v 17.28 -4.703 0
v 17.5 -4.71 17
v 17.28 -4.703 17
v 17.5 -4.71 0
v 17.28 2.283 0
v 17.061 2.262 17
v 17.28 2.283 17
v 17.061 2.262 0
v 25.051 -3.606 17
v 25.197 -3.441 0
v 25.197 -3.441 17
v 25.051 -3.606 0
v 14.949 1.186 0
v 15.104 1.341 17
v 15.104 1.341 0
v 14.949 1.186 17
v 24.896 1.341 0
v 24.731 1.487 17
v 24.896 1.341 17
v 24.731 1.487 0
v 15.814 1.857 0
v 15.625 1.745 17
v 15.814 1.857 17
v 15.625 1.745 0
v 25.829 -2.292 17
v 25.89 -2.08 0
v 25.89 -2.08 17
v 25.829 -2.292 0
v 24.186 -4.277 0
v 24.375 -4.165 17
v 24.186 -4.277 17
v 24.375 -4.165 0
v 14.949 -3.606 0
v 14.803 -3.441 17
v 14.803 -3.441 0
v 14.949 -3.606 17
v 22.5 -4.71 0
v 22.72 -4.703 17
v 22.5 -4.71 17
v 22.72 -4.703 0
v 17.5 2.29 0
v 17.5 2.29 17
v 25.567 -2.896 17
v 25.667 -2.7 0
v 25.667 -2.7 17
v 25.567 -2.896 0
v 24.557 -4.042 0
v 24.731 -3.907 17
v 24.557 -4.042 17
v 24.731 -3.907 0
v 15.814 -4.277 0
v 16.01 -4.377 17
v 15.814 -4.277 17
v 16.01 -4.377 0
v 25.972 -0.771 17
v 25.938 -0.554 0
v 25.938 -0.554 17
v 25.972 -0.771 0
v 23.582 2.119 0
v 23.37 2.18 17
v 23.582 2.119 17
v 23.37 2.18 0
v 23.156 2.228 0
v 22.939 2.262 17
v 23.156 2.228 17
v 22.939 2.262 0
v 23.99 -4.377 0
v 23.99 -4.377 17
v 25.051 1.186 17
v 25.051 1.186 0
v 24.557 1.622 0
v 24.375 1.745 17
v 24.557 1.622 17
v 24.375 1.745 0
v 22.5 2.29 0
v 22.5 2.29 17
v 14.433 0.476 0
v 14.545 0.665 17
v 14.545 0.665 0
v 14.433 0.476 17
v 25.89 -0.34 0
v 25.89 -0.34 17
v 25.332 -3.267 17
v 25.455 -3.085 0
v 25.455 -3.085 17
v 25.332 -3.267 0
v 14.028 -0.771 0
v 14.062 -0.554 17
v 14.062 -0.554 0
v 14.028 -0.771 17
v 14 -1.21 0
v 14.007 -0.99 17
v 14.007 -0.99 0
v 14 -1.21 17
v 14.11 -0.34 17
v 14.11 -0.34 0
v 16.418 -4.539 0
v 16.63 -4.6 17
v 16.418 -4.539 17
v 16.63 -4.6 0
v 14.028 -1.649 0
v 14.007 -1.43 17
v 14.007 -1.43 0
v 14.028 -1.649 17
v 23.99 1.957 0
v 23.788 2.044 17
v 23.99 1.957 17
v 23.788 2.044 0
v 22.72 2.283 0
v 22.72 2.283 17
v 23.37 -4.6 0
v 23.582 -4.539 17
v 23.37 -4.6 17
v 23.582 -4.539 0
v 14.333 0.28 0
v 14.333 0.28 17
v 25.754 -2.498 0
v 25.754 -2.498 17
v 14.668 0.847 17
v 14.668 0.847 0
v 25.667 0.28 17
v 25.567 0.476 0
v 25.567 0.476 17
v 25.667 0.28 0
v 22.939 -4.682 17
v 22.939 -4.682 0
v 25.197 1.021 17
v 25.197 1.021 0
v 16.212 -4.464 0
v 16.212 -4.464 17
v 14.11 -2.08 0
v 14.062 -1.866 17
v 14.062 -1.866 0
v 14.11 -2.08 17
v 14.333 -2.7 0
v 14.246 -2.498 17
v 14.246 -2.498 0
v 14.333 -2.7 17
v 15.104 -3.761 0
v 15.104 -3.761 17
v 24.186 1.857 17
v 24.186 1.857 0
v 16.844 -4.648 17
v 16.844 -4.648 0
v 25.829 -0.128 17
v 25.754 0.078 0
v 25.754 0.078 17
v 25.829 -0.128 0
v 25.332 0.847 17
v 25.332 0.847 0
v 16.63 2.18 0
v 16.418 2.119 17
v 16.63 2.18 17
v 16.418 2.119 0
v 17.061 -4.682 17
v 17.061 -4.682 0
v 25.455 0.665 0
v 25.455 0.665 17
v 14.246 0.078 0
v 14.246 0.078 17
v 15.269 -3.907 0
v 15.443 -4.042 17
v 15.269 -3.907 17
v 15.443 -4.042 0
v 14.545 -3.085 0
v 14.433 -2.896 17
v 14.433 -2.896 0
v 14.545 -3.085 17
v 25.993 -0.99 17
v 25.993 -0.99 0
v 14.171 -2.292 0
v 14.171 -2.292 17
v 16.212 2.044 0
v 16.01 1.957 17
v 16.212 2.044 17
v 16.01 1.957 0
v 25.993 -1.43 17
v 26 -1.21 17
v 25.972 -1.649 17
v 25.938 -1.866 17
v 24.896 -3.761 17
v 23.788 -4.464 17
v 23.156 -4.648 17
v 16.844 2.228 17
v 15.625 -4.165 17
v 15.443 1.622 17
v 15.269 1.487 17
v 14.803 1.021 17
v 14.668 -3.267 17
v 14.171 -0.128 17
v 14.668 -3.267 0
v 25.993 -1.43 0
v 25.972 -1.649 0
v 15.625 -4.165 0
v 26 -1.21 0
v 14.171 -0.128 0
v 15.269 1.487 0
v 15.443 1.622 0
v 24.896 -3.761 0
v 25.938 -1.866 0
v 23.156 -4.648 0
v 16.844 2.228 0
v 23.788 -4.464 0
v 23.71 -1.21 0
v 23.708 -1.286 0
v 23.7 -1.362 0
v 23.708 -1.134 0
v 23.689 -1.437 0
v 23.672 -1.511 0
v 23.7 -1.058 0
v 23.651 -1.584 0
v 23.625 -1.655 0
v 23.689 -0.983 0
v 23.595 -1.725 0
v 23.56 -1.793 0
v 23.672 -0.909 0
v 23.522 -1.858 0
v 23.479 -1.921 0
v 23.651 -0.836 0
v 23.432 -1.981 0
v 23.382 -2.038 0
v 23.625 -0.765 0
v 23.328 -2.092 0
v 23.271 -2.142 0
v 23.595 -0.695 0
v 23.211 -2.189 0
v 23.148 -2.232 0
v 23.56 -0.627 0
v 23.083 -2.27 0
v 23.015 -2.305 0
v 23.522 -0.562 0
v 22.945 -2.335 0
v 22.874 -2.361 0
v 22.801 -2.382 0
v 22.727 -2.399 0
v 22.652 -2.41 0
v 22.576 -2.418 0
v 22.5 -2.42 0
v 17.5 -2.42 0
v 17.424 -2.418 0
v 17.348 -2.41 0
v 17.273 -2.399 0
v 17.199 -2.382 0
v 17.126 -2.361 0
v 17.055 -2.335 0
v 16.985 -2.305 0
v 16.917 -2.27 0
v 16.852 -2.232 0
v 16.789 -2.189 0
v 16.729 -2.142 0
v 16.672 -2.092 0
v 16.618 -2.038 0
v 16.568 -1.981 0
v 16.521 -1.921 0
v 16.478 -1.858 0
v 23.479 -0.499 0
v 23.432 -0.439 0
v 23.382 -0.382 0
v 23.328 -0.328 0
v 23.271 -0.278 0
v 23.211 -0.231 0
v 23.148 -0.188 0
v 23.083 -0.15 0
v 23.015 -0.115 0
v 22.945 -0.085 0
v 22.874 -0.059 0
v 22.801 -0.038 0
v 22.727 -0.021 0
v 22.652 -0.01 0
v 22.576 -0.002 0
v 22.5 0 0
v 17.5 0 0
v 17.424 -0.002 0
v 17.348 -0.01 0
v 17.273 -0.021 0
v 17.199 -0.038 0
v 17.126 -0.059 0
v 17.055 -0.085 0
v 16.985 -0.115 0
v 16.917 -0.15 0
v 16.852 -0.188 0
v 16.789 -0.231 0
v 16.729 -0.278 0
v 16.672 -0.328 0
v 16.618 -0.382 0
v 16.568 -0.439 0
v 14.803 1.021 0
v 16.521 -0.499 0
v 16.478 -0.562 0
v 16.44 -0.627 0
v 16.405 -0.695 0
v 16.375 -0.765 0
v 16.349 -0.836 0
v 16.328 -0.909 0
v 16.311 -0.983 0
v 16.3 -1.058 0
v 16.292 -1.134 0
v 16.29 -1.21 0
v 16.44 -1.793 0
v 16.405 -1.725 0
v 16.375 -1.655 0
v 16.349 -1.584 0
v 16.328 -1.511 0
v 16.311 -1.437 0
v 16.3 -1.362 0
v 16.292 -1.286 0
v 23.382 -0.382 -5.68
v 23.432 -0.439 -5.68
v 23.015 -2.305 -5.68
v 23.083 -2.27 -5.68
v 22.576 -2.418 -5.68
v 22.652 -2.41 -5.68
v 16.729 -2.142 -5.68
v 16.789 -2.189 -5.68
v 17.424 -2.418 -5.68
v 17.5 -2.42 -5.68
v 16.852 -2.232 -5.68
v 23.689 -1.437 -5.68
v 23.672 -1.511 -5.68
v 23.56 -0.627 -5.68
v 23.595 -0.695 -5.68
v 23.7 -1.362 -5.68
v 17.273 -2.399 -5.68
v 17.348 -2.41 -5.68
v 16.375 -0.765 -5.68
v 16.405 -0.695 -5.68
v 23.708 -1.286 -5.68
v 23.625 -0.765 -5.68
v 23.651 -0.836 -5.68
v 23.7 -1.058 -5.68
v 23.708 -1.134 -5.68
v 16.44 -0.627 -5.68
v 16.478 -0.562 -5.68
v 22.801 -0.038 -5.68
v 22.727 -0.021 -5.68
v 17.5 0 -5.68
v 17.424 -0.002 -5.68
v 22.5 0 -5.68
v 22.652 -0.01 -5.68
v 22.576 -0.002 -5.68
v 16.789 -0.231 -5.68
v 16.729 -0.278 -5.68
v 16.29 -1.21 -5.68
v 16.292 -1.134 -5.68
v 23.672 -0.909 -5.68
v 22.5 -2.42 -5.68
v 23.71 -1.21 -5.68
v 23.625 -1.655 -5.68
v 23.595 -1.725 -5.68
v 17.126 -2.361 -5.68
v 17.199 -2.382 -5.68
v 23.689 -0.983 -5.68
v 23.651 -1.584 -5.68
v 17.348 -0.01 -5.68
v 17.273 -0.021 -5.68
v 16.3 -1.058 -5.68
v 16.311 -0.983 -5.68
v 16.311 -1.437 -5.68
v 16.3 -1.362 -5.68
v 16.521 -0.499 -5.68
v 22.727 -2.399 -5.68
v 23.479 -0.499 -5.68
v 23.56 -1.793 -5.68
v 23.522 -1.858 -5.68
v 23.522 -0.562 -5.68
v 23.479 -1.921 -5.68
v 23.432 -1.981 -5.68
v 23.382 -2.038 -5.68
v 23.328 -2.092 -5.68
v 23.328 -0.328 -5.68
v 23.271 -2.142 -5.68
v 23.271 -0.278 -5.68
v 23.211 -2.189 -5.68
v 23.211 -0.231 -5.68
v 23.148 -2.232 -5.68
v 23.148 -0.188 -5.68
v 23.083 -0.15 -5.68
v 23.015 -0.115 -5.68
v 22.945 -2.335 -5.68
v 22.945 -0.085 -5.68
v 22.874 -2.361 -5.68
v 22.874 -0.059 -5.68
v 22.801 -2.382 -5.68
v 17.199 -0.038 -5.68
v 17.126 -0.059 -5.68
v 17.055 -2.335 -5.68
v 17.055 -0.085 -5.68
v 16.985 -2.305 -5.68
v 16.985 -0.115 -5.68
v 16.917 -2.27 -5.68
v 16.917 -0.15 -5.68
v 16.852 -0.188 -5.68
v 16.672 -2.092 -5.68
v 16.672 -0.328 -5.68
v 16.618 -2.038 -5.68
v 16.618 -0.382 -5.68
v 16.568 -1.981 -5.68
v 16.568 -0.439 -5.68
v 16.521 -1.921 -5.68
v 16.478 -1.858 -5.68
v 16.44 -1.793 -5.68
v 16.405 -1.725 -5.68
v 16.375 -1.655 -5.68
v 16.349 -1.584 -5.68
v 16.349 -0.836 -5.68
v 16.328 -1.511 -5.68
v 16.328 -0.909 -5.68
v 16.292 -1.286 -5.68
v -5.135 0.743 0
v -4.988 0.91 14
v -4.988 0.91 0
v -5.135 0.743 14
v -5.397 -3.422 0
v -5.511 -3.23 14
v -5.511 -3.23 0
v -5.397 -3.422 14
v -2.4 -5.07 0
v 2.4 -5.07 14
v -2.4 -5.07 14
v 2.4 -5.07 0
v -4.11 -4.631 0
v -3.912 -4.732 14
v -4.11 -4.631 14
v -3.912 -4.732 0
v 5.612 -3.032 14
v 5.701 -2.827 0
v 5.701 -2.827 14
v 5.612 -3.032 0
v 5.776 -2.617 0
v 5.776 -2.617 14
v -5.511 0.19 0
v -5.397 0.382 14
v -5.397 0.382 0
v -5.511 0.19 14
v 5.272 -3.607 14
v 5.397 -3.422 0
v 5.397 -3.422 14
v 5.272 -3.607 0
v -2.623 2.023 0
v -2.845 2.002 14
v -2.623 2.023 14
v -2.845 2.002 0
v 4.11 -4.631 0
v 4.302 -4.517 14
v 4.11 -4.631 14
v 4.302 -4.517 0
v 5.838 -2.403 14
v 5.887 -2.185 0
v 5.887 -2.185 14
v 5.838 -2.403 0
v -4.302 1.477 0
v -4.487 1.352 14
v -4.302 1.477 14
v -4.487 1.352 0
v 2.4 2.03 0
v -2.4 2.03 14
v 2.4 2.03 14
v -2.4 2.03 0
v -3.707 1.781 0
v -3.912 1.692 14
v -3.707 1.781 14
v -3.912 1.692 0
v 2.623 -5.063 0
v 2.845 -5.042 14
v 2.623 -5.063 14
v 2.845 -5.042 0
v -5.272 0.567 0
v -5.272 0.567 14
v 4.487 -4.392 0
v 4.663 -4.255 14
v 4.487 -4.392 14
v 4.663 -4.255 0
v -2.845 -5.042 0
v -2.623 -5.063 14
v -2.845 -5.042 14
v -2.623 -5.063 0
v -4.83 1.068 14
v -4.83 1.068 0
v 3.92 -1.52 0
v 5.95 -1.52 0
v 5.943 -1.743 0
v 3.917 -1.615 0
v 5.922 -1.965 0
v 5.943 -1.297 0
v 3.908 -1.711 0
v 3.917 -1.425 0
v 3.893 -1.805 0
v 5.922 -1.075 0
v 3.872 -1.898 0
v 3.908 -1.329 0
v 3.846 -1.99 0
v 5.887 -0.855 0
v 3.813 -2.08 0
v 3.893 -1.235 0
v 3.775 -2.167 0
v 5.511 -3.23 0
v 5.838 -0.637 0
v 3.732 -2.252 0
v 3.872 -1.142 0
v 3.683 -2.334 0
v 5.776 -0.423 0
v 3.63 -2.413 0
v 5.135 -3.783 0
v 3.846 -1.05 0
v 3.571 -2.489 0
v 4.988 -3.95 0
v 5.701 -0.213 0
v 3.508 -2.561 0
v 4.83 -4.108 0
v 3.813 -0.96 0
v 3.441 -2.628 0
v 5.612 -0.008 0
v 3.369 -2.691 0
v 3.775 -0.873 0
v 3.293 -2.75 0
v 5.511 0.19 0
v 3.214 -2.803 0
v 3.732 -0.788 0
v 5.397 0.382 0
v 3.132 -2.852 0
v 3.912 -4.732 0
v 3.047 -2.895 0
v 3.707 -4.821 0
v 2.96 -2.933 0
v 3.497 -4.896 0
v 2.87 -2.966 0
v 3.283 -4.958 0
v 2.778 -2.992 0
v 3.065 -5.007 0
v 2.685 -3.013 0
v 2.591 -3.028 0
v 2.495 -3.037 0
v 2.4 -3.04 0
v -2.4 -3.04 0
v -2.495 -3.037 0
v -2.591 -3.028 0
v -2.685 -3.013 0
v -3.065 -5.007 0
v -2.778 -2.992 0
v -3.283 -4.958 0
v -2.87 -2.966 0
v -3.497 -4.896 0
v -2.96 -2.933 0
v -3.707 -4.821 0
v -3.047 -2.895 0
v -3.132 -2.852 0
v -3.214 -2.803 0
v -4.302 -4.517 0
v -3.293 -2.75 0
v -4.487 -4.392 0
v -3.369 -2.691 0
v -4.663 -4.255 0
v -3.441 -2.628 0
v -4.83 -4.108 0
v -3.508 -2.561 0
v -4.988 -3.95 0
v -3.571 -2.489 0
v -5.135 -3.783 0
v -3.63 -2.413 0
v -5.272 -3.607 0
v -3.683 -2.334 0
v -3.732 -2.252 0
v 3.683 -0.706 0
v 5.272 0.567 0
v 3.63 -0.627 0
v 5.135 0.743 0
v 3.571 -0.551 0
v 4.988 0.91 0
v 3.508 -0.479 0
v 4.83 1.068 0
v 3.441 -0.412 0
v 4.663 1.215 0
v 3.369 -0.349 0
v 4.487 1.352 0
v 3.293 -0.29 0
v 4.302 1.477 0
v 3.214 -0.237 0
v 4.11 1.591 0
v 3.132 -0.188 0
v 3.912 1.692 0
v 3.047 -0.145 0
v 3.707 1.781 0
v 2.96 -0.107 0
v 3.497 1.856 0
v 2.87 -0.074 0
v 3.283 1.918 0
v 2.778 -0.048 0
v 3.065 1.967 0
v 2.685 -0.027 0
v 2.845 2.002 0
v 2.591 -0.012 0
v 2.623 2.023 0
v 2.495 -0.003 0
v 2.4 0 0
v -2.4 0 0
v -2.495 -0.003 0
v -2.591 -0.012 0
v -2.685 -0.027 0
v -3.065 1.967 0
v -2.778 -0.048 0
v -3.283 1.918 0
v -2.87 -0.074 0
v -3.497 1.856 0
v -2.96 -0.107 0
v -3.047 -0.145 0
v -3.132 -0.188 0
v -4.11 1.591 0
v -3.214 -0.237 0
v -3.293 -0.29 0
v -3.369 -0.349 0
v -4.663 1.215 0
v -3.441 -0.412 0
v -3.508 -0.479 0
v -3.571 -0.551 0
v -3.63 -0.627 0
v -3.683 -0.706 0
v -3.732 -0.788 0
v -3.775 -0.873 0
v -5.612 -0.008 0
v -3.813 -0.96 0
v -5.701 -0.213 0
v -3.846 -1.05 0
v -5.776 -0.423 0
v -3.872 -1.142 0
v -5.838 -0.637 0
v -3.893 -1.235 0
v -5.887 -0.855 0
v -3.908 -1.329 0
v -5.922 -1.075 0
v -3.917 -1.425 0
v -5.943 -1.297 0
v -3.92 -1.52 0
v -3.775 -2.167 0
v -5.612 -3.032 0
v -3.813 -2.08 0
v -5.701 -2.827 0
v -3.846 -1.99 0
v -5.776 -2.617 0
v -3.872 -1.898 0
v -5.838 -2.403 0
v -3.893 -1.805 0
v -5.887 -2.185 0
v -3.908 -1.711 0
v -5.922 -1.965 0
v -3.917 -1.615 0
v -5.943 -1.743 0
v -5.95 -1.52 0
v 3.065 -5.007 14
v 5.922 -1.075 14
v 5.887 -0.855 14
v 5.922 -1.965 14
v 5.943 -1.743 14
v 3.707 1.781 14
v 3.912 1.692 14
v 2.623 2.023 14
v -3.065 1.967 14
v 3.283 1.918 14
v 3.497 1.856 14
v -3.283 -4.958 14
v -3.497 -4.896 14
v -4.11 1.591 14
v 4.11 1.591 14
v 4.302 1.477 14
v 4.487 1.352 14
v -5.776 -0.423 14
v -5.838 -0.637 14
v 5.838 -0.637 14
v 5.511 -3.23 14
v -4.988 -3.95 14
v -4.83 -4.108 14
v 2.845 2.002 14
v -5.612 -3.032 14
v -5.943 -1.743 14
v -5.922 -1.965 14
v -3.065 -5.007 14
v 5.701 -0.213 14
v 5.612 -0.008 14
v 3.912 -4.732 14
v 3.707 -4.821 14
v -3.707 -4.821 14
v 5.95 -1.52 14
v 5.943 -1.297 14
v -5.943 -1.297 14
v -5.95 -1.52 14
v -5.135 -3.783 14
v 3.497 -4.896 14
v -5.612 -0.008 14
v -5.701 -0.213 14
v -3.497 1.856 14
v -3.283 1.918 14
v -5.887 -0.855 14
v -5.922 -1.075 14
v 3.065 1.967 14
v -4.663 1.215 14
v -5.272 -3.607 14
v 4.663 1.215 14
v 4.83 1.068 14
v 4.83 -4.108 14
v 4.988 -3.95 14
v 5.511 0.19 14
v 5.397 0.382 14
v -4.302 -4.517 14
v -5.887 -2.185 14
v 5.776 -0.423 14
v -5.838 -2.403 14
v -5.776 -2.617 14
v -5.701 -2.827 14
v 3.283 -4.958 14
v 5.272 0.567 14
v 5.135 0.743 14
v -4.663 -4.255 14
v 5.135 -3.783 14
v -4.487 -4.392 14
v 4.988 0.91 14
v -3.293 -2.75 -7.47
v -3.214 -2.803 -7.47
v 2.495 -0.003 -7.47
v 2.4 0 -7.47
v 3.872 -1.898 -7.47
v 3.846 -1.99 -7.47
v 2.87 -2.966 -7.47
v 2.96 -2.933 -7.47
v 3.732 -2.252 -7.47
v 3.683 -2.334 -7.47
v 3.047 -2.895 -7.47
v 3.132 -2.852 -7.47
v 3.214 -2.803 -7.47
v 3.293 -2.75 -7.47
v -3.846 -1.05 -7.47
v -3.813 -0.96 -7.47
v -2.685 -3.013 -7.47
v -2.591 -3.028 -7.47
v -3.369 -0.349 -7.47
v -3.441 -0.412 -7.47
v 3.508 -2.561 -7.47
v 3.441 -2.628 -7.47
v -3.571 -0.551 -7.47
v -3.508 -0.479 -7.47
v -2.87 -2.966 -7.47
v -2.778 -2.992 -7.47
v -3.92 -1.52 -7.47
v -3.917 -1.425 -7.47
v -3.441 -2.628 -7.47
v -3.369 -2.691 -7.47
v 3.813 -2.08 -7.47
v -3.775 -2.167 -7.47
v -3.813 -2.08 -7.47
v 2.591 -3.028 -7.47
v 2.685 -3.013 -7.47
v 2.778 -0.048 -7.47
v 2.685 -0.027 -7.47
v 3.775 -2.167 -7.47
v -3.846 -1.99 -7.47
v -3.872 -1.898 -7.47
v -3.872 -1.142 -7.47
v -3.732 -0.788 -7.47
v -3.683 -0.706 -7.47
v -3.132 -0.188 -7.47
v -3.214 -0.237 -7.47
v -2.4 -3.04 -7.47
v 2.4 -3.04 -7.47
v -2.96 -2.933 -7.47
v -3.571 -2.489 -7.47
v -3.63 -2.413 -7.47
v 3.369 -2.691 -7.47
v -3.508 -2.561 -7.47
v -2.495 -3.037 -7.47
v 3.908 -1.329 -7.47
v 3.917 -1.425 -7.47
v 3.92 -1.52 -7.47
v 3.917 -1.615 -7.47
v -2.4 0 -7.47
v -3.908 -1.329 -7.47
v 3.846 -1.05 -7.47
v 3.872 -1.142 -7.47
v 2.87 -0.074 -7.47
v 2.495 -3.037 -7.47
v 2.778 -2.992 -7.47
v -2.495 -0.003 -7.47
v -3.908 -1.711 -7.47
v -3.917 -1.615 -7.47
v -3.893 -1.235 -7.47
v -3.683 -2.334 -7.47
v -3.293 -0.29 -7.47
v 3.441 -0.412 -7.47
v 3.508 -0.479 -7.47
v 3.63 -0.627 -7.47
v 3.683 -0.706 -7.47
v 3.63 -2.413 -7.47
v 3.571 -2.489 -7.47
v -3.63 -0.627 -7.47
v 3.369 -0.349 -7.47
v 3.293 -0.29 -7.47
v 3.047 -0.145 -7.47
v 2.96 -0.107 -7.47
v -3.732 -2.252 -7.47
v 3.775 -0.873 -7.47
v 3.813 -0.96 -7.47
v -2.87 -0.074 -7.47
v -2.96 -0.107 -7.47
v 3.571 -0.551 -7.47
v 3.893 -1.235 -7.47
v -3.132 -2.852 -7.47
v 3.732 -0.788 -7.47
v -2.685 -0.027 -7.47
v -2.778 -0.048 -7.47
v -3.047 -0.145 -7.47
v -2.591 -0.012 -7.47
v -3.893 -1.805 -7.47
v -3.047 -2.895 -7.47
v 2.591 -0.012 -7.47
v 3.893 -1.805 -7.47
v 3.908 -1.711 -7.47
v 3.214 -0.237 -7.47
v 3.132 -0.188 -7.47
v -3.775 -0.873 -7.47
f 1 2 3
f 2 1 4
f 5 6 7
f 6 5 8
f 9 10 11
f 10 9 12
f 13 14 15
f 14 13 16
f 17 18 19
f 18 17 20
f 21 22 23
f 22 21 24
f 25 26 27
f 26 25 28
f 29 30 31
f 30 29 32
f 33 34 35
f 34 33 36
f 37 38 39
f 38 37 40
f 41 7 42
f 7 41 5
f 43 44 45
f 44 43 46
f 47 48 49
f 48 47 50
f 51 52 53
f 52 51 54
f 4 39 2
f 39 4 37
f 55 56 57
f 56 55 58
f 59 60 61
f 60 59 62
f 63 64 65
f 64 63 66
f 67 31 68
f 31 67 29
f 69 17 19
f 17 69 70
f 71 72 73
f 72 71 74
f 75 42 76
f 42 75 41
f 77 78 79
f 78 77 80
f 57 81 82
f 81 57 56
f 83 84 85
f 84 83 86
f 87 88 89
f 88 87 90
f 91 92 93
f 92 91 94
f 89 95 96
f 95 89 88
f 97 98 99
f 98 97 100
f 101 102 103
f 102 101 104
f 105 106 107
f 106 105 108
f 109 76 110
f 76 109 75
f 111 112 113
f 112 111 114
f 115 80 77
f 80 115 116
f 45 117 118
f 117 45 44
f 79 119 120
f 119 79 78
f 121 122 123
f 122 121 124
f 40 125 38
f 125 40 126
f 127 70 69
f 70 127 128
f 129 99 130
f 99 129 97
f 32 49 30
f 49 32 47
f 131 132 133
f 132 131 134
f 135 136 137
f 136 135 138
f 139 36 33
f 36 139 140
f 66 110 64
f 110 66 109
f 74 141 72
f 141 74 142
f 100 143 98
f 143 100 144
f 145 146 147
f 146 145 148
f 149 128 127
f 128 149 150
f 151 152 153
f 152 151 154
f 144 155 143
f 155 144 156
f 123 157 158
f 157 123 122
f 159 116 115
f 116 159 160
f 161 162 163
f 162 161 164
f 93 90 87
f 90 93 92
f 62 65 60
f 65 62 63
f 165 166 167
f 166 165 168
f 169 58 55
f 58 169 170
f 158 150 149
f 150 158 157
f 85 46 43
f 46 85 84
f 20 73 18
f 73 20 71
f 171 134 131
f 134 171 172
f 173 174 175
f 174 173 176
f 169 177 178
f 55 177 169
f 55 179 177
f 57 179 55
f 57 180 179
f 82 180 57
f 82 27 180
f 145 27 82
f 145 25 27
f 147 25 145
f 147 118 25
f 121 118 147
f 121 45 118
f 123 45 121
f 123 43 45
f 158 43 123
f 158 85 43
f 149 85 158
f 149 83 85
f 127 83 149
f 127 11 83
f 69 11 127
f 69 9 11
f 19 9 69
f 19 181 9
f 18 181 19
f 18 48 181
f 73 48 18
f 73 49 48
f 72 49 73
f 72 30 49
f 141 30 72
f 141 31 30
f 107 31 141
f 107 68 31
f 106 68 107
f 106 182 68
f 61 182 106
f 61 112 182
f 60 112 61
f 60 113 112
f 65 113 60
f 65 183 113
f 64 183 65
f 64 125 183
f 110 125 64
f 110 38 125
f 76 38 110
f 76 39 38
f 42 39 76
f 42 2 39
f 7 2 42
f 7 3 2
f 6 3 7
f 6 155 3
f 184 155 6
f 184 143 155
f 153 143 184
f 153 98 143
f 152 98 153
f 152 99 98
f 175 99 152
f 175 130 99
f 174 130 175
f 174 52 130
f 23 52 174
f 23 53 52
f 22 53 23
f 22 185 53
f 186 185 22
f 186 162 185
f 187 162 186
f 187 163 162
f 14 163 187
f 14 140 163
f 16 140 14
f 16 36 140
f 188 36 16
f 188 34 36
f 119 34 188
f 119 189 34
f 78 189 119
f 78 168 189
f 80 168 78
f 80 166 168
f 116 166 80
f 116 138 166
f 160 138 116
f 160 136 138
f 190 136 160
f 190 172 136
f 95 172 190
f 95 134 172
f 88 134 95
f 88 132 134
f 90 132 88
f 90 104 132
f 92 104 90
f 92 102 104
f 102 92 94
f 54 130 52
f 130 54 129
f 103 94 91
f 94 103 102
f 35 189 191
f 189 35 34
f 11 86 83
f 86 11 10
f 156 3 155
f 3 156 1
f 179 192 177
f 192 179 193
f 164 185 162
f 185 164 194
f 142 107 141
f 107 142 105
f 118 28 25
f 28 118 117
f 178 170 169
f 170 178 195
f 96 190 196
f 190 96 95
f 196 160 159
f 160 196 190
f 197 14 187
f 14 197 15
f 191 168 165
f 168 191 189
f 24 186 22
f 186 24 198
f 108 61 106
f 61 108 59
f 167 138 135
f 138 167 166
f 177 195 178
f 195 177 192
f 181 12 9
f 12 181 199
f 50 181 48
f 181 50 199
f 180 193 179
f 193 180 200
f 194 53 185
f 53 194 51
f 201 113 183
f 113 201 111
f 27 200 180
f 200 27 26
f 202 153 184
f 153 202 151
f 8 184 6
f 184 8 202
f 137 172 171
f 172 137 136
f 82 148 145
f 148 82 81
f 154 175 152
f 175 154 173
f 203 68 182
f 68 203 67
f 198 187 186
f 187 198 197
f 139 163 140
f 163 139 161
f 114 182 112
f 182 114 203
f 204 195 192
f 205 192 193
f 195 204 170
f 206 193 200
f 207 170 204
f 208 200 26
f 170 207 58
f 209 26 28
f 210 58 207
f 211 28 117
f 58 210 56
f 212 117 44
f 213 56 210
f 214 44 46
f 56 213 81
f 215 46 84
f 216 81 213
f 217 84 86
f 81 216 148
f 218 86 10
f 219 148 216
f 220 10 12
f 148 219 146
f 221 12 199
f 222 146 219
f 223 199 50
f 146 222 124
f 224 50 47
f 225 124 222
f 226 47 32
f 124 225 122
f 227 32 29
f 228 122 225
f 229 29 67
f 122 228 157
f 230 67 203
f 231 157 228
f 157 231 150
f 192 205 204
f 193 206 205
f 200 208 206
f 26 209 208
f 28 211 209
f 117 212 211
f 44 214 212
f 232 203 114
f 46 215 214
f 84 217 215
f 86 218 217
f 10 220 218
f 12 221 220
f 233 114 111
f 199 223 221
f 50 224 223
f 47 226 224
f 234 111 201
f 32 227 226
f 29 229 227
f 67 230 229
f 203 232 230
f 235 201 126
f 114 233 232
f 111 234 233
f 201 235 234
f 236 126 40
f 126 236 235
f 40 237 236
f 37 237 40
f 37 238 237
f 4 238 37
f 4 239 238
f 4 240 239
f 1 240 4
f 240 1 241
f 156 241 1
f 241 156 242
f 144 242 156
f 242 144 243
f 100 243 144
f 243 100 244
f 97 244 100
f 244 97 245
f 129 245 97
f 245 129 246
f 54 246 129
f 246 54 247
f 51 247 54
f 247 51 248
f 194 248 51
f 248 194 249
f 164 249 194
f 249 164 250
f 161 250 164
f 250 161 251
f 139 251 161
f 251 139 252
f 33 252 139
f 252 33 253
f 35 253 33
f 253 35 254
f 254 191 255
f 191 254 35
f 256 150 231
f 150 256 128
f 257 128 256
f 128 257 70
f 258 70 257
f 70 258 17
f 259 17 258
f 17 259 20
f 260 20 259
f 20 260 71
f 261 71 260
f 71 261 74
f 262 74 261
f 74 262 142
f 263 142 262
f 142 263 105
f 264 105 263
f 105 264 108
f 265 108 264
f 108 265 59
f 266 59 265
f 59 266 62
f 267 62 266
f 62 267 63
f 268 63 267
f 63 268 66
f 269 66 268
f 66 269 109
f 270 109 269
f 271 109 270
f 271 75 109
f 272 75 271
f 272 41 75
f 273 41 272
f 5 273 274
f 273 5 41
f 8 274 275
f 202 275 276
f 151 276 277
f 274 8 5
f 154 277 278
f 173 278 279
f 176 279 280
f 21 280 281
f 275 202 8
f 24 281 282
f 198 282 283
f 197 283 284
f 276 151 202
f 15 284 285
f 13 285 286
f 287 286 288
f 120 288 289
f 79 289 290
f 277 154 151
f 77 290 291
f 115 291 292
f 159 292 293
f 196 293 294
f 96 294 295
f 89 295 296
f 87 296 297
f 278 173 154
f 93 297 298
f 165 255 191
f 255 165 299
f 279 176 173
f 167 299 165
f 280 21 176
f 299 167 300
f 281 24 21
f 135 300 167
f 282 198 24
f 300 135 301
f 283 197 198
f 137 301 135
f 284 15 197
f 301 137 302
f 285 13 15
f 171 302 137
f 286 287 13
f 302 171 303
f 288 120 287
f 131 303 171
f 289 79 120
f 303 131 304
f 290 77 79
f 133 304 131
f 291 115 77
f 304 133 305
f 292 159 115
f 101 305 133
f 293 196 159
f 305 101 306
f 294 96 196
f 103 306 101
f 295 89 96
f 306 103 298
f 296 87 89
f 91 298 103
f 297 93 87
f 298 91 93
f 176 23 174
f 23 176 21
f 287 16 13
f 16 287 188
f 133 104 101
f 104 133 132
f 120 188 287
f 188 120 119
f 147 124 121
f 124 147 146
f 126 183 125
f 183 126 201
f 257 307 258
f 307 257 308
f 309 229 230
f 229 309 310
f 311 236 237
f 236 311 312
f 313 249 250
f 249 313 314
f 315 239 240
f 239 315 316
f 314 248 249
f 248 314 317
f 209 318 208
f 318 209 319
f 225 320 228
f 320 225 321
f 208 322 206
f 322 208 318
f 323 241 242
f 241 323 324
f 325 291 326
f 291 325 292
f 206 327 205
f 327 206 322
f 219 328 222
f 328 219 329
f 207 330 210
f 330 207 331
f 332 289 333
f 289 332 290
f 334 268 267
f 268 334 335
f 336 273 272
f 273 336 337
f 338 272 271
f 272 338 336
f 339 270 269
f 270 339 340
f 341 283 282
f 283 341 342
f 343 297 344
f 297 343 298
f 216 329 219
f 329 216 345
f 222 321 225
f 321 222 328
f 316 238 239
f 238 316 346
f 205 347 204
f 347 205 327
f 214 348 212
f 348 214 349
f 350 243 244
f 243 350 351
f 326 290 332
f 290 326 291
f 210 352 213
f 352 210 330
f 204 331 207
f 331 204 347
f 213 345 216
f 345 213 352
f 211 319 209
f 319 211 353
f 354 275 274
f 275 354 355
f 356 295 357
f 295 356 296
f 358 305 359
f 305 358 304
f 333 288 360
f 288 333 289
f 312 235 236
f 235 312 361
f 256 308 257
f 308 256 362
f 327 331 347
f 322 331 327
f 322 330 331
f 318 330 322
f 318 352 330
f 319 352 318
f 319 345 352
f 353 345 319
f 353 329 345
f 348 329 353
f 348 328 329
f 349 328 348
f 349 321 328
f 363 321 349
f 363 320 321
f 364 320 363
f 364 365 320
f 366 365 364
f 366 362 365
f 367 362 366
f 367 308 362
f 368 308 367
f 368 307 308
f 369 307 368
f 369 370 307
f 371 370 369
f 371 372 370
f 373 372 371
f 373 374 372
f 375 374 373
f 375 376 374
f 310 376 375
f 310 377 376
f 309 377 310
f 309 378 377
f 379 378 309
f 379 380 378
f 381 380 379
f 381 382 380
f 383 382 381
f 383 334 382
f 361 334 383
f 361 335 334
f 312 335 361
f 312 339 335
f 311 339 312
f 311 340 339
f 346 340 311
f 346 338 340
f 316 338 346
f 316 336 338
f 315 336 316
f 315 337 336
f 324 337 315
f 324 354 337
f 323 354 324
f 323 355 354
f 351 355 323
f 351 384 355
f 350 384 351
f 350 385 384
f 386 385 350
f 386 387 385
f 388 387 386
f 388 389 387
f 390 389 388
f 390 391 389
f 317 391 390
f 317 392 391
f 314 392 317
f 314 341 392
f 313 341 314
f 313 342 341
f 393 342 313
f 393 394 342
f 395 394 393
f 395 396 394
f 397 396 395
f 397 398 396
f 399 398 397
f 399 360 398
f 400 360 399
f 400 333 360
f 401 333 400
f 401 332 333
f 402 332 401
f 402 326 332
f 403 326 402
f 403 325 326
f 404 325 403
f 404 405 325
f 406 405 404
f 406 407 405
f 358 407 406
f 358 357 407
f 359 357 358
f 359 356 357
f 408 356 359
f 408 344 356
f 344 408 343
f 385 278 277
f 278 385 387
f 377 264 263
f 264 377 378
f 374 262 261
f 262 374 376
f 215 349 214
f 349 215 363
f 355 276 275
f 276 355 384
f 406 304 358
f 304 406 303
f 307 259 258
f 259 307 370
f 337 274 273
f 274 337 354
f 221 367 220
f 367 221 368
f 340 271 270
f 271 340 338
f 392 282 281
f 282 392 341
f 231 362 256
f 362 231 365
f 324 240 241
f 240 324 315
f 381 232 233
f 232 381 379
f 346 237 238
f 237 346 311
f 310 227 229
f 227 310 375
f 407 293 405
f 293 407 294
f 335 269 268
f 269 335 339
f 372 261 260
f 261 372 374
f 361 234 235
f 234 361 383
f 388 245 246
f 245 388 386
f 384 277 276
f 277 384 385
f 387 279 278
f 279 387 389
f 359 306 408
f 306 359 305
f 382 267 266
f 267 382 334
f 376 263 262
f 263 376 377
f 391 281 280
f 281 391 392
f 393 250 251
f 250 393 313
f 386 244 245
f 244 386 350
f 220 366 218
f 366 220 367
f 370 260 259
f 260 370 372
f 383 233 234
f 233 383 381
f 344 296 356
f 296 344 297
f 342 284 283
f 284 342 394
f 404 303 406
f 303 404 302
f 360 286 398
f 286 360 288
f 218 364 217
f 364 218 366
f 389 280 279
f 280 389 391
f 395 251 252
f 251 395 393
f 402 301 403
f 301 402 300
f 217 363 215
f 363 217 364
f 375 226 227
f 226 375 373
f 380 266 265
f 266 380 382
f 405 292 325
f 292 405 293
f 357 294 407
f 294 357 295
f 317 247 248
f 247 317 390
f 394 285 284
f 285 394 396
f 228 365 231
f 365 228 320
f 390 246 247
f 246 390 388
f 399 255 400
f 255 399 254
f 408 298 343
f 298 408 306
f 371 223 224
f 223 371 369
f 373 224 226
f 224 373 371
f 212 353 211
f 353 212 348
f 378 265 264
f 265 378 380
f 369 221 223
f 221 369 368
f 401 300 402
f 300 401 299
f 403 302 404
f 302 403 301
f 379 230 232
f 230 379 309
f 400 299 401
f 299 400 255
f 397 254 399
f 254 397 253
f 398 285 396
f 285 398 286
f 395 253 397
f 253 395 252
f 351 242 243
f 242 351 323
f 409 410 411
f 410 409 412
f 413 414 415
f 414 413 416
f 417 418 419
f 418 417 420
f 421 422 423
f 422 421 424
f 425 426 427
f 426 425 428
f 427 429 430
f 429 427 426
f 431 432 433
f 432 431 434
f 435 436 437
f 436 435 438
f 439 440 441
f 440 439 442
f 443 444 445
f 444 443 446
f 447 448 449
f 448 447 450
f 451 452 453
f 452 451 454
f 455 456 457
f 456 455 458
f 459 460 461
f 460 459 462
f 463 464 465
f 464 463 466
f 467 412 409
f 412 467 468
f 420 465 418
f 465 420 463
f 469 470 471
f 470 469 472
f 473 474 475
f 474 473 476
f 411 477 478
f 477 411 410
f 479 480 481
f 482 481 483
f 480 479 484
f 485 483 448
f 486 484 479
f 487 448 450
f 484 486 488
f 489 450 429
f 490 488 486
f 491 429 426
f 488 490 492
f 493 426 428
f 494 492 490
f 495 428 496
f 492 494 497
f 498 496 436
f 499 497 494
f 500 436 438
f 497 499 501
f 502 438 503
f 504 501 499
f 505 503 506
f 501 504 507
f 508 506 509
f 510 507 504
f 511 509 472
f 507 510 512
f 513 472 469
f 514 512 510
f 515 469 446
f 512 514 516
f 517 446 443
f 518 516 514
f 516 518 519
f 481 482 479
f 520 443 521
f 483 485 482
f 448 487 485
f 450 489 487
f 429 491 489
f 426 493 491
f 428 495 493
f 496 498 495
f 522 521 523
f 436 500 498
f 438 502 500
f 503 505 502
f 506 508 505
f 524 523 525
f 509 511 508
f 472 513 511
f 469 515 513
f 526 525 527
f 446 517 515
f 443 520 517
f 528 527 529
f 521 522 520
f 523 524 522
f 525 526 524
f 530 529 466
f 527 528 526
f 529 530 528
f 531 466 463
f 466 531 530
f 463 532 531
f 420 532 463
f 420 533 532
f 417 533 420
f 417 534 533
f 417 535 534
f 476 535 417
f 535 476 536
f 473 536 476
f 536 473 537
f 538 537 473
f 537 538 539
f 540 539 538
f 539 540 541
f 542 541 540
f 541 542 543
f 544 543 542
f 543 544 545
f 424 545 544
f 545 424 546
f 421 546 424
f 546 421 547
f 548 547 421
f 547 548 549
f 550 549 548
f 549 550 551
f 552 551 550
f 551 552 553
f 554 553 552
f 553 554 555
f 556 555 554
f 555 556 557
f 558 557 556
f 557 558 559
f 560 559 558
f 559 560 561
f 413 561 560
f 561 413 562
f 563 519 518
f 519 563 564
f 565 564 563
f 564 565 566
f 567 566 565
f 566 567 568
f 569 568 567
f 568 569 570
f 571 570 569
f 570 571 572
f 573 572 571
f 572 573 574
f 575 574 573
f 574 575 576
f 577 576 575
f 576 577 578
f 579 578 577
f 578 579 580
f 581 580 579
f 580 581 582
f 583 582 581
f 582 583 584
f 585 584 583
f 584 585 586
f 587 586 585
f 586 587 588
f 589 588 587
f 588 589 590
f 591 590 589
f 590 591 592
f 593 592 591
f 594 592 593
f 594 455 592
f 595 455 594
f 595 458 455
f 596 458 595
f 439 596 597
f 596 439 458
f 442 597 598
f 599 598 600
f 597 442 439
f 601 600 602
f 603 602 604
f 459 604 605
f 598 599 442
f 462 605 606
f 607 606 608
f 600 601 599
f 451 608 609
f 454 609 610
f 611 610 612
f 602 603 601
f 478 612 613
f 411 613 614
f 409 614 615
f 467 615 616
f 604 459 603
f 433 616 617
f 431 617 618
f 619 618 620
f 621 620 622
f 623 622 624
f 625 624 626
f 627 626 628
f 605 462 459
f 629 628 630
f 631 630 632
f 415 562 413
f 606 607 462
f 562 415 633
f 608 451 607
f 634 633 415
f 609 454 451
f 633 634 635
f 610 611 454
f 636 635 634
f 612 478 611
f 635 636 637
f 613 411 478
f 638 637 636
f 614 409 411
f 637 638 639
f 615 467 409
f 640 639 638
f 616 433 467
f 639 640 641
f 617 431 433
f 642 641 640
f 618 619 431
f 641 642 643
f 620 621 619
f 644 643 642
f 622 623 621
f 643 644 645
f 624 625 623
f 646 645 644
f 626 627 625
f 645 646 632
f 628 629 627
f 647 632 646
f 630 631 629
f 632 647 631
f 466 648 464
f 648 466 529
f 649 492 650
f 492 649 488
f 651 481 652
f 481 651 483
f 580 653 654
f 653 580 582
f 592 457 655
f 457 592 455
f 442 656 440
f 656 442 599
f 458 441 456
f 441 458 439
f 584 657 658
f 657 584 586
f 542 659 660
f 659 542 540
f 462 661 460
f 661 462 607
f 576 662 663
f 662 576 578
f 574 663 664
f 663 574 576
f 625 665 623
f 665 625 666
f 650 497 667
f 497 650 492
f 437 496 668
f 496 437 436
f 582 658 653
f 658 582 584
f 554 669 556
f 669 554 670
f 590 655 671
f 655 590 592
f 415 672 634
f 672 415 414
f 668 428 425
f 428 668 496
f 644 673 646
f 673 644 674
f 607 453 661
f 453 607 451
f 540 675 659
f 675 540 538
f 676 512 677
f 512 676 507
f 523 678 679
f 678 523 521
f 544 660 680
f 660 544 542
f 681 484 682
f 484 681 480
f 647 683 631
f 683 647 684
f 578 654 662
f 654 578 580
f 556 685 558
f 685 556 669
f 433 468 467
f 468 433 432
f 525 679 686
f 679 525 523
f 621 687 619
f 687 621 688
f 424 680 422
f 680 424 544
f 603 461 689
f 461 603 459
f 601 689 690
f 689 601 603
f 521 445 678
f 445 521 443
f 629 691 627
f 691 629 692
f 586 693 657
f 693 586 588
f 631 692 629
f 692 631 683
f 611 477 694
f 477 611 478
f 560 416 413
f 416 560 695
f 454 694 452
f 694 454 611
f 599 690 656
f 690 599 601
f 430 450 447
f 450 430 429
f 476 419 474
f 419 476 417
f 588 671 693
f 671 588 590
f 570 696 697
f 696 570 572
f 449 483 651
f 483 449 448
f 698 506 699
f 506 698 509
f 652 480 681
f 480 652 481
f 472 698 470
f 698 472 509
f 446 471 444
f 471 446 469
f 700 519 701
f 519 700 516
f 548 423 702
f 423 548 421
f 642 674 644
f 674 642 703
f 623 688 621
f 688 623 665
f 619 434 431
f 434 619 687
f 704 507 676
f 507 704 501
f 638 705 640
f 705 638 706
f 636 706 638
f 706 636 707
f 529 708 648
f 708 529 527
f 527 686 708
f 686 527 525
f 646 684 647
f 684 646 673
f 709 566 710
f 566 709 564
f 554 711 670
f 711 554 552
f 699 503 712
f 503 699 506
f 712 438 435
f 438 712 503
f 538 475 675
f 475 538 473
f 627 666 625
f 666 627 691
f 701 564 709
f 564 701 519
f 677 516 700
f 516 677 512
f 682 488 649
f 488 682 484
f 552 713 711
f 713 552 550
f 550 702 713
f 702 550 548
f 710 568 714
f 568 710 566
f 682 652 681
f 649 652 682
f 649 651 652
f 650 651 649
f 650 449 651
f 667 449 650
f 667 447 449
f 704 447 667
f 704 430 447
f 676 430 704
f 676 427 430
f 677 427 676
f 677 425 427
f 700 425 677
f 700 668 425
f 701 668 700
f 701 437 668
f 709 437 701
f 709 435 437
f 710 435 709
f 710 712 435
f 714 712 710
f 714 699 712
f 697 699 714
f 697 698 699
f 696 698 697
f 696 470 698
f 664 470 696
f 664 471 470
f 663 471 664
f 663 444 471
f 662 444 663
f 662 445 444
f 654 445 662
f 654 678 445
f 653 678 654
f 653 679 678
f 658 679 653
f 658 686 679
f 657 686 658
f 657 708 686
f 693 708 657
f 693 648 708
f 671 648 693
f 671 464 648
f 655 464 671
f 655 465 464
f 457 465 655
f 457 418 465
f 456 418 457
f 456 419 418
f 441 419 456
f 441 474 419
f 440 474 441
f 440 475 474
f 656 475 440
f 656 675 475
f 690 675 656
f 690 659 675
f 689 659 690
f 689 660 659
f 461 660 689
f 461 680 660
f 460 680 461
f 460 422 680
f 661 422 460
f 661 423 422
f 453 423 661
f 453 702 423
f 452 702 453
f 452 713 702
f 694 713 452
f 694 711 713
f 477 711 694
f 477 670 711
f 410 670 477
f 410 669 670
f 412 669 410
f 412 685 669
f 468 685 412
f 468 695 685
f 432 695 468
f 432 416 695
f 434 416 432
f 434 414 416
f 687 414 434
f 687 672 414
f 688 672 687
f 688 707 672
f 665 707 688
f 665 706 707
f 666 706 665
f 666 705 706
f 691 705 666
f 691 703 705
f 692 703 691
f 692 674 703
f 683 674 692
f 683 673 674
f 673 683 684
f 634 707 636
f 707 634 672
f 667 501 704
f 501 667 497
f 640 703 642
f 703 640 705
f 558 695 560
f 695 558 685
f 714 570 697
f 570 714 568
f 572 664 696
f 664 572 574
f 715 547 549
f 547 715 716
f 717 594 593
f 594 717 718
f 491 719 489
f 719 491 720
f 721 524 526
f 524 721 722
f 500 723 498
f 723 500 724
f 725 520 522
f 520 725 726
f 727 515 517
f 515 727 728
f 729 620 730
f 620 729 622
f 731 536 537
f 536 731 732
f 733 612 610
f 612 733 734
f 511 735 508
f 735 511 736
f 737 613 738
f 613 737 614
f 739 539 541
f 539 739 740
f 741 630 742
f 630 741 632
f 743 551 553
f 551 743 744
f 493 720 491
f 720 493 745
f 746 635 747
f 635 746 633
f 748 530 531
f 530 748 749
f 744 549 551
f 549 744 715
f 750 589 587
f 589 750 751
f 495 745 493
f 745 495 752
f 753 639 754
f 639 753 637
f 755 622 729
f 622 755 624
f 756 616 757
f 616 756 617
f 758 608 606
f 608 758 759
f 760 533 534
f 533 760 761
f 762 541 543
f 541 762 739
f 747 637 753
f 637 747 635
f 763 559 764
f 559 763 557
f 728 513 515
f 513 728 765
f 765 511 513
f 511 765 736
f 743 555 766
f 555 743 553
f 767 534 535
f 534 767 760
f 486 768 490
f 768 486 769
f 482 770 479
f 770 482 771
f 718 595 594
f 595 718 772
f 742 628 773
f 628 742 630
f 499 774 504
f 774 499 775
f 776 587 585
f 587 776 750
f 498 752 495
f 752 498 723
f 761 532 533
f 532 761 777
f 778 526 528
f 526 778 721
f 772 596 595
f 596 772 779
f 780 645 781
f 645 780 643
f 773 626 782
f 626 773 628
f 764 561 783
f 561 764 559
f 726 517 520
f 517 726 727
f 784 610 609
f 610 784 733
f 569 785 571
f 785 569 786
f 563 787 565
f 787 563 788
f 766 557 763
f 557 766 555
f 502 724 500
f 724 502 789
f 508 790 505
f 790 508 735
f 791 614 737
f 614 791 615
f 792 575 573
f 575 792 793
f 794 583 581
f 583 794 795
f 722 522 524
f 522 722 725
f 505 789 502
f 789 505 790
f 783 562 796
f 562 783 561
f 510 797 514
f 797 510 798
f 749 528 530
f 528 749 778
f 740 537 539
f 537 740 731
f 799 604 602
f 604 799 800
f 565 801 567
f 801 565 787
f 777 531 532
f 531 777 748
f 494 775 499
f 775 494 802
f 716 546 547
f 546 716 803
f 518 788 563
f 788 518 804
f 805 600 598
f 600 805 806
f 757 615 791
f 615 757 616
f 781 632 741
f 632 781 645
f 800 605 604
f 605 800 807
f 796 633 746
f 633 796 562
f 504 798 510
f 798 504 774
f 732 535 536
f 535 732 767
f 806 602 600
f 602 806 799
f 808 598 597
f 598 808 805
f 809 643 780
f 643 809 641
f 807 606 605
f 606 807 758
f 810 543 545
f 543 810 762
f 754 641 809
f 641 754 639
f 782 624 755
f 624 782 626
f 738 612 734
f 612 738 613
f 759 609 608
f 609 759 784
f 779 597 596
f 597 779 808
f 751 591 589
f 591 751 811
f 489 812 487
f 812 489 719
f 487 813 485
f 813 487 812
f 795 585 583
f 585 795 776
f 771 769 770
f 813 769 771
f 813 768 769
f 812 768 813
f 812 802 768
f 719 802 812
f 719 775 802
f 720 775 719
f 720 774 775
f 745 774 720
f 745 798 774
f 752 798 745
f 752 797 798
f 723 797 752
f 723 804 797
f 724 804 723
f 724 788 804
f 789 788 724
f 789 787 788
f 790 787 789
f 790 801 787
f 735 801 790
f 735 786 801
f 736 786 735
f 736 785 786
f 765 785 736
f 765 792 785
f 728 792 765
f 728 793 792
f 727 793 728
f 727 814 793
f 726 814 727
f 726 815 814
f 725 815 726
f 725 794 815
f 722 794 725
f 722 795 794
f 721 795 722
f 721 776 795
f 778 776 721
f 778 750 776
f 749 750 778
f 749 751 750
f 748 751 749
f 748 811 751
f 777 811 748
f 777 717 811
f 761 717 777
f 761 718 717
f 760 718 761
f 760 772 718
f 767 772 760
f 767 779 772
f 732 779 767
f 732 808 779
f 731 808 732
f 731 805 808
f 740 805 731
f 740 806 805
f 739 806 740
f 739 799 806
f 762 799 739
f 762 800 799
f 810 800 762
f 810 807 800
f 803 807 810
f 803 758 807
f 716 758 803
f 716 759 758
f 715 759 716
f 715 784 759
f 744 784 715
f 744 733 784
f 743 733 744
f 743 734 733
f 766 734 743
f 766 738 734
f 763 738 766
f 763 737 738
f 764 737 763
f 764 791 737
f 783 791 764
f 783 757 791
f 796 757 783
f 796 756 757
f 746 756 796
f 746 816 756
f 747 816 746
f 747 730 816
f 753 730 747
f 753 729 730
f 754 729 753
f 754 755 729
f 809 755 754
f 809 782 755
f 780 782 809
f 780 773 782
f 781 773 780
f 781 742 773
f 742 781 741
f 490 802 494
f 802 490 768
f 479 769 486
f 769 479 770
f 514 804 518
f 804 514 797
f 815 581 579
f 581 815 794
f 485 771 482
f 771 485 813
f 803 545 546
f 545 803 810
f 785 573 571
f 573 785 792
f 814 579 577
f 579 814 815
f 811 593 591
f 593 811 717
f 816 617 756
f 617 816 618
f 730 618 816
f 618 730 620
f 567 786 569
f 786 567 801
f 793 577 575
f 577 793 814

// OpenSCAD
/* [Hidden] */

TWEAK = 1;

module make_USBA()
{
     DIA = 6 + TWEAK;
     WIDTH = 11.0 + TWEAK;
     DIST = WIDTH - DIA;
     LENGTH = 17.0;

     xDIA = 1.92 + TWEAK/2;
     xWIDTH = 7.0 + TWEAK/2;
     xDIST = WIDTH - DIA;
     xLENGTH = 5.68;

    translate([ 0, -xDIA, 0])  // "0" is where part sits ON a board
    {
         if ($preview)
         {
             color("PINK")
             translate( [-WIDTH , xDIA, 0])  // one face to sit 'on the board'
             rotate([90, 90, 0])
             cube( [WIDTH * 2, WIDTH * 2, 0.1], center = false);    // targeting plane
         }
         
         translate( [0, xDIA/2, 0])  // one face to sit 'on the board'
         {
             

             color("YELLOW", .3)
             hull()
             {
                 translate([ DIST /2, 0, 0 ])
                 cylinder(h = LENGTH, d = DIA, $fn=100);
                 
                 translate([ -DIST /2, 0, 0 ])
                 cylinder(h = LENGTH, d = DIA, $fn=100);
             }
             
             rotate([180, 0, 0])
             #hull()
             {
                 translate([ xDIST /2, 0, 0 ])
                 cylinder(h = xLENGTH, d = xDIA, $fn=100);
                 
                 translate([ -xDIST /2, 0, 0 ])
                 cylinder(h = xLENGTH, d = xDIA, $fn=100);
             }
         }
     }
}

module make_USBC()
{
     DIA = 6.10 + TWEAK;
     WIDTH = 10.9 + TWEAK;
     DIST = WIDTH - DIA;
     LENGTH = 14.0;

     xDIA = 2.54 + TWEAK/2;
     xWIDTH = 8.25 + TWEAK/2;
     xDIST = WIDTH - DIA;
     xLENGTH = 7.47;

     translate([ 0, -xDIA, 0])  // "0" is where part sits ON a board
     {
         if ($preview)
         {
             color("CYAN")
             translate( [-WIDTH , xDIA, 0])  // one face to sit 'on the board'
             rotate([90, 90, 0])
             cube( [WIDTH * 2, WIDTH * 2, 0.1], center = false);    // targeting plane
         }
         

         translate( [0, xDIA/2, 0])  // one face to sit 'on the board'
         {
             color("YELLOW", .3)
             hull()
             {
                 translate([ DIST /2, 0, 0 ])
                 cylinder(h = LENGTH, d = DIA, $fn=100);
                 
                 translate([ -DIST /2, 0, 0 ])
                 cylinder(h = LENGTH, d = DIA, $fn=100);
             }
             
             rotate([180, 0, 0])
             #hull()
             {
                 translate([ xDIST /2, 0, 0 ])
                 cylinder(h = xLENGTH, d = xDIA, $fn=100);
                 
                 translate([ -xDIST /2, 0, 0 ])
                 cylinder(h = xLENGTH, d = xDIA, $fn=100);
             }
        }
    }
}
translate([20, 0, 0])
make_USBA();
make_USBC();
